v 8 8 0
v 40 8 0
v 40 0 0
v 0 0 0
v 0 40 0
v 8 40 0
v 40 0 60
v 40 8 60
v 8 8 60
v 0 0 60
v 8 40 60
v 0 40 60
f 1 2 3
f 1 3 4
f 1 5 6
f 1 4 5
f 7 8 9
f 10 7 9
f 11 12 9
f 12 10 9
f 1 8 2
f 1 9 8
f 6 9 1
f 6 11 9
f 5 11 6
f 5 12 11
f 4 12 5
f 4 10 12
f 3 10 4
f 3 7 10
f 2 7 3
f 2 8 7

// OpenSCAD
$fn = 32;

// ----------------------------------------------------------------------
// Structural section: angle 40 x 40 mm
// ----------------------------------------------------------------------

// --- parameters (mm) ---
sec_w = 40;               // leg width, X
sec_h = 40;               // leg height, Y
flange_t = 8;             // leg thickness
plate_t = 60;             // cut length, Z (extrusion height)
fit_tol = 0.1;            // declared fit tolerance (prompt contract)
free_tol = 0.5;           // declared free tolerance (prompt contract)

profile = [[0, 0], [40, 0], [40, 8], [8, 8], [8, 40], [0, 40]];  // primary outline, 6 points, counter clockwise

// --- the one profile operation ---
linear_extrude(height = plate_t) polygon(points = profile);
